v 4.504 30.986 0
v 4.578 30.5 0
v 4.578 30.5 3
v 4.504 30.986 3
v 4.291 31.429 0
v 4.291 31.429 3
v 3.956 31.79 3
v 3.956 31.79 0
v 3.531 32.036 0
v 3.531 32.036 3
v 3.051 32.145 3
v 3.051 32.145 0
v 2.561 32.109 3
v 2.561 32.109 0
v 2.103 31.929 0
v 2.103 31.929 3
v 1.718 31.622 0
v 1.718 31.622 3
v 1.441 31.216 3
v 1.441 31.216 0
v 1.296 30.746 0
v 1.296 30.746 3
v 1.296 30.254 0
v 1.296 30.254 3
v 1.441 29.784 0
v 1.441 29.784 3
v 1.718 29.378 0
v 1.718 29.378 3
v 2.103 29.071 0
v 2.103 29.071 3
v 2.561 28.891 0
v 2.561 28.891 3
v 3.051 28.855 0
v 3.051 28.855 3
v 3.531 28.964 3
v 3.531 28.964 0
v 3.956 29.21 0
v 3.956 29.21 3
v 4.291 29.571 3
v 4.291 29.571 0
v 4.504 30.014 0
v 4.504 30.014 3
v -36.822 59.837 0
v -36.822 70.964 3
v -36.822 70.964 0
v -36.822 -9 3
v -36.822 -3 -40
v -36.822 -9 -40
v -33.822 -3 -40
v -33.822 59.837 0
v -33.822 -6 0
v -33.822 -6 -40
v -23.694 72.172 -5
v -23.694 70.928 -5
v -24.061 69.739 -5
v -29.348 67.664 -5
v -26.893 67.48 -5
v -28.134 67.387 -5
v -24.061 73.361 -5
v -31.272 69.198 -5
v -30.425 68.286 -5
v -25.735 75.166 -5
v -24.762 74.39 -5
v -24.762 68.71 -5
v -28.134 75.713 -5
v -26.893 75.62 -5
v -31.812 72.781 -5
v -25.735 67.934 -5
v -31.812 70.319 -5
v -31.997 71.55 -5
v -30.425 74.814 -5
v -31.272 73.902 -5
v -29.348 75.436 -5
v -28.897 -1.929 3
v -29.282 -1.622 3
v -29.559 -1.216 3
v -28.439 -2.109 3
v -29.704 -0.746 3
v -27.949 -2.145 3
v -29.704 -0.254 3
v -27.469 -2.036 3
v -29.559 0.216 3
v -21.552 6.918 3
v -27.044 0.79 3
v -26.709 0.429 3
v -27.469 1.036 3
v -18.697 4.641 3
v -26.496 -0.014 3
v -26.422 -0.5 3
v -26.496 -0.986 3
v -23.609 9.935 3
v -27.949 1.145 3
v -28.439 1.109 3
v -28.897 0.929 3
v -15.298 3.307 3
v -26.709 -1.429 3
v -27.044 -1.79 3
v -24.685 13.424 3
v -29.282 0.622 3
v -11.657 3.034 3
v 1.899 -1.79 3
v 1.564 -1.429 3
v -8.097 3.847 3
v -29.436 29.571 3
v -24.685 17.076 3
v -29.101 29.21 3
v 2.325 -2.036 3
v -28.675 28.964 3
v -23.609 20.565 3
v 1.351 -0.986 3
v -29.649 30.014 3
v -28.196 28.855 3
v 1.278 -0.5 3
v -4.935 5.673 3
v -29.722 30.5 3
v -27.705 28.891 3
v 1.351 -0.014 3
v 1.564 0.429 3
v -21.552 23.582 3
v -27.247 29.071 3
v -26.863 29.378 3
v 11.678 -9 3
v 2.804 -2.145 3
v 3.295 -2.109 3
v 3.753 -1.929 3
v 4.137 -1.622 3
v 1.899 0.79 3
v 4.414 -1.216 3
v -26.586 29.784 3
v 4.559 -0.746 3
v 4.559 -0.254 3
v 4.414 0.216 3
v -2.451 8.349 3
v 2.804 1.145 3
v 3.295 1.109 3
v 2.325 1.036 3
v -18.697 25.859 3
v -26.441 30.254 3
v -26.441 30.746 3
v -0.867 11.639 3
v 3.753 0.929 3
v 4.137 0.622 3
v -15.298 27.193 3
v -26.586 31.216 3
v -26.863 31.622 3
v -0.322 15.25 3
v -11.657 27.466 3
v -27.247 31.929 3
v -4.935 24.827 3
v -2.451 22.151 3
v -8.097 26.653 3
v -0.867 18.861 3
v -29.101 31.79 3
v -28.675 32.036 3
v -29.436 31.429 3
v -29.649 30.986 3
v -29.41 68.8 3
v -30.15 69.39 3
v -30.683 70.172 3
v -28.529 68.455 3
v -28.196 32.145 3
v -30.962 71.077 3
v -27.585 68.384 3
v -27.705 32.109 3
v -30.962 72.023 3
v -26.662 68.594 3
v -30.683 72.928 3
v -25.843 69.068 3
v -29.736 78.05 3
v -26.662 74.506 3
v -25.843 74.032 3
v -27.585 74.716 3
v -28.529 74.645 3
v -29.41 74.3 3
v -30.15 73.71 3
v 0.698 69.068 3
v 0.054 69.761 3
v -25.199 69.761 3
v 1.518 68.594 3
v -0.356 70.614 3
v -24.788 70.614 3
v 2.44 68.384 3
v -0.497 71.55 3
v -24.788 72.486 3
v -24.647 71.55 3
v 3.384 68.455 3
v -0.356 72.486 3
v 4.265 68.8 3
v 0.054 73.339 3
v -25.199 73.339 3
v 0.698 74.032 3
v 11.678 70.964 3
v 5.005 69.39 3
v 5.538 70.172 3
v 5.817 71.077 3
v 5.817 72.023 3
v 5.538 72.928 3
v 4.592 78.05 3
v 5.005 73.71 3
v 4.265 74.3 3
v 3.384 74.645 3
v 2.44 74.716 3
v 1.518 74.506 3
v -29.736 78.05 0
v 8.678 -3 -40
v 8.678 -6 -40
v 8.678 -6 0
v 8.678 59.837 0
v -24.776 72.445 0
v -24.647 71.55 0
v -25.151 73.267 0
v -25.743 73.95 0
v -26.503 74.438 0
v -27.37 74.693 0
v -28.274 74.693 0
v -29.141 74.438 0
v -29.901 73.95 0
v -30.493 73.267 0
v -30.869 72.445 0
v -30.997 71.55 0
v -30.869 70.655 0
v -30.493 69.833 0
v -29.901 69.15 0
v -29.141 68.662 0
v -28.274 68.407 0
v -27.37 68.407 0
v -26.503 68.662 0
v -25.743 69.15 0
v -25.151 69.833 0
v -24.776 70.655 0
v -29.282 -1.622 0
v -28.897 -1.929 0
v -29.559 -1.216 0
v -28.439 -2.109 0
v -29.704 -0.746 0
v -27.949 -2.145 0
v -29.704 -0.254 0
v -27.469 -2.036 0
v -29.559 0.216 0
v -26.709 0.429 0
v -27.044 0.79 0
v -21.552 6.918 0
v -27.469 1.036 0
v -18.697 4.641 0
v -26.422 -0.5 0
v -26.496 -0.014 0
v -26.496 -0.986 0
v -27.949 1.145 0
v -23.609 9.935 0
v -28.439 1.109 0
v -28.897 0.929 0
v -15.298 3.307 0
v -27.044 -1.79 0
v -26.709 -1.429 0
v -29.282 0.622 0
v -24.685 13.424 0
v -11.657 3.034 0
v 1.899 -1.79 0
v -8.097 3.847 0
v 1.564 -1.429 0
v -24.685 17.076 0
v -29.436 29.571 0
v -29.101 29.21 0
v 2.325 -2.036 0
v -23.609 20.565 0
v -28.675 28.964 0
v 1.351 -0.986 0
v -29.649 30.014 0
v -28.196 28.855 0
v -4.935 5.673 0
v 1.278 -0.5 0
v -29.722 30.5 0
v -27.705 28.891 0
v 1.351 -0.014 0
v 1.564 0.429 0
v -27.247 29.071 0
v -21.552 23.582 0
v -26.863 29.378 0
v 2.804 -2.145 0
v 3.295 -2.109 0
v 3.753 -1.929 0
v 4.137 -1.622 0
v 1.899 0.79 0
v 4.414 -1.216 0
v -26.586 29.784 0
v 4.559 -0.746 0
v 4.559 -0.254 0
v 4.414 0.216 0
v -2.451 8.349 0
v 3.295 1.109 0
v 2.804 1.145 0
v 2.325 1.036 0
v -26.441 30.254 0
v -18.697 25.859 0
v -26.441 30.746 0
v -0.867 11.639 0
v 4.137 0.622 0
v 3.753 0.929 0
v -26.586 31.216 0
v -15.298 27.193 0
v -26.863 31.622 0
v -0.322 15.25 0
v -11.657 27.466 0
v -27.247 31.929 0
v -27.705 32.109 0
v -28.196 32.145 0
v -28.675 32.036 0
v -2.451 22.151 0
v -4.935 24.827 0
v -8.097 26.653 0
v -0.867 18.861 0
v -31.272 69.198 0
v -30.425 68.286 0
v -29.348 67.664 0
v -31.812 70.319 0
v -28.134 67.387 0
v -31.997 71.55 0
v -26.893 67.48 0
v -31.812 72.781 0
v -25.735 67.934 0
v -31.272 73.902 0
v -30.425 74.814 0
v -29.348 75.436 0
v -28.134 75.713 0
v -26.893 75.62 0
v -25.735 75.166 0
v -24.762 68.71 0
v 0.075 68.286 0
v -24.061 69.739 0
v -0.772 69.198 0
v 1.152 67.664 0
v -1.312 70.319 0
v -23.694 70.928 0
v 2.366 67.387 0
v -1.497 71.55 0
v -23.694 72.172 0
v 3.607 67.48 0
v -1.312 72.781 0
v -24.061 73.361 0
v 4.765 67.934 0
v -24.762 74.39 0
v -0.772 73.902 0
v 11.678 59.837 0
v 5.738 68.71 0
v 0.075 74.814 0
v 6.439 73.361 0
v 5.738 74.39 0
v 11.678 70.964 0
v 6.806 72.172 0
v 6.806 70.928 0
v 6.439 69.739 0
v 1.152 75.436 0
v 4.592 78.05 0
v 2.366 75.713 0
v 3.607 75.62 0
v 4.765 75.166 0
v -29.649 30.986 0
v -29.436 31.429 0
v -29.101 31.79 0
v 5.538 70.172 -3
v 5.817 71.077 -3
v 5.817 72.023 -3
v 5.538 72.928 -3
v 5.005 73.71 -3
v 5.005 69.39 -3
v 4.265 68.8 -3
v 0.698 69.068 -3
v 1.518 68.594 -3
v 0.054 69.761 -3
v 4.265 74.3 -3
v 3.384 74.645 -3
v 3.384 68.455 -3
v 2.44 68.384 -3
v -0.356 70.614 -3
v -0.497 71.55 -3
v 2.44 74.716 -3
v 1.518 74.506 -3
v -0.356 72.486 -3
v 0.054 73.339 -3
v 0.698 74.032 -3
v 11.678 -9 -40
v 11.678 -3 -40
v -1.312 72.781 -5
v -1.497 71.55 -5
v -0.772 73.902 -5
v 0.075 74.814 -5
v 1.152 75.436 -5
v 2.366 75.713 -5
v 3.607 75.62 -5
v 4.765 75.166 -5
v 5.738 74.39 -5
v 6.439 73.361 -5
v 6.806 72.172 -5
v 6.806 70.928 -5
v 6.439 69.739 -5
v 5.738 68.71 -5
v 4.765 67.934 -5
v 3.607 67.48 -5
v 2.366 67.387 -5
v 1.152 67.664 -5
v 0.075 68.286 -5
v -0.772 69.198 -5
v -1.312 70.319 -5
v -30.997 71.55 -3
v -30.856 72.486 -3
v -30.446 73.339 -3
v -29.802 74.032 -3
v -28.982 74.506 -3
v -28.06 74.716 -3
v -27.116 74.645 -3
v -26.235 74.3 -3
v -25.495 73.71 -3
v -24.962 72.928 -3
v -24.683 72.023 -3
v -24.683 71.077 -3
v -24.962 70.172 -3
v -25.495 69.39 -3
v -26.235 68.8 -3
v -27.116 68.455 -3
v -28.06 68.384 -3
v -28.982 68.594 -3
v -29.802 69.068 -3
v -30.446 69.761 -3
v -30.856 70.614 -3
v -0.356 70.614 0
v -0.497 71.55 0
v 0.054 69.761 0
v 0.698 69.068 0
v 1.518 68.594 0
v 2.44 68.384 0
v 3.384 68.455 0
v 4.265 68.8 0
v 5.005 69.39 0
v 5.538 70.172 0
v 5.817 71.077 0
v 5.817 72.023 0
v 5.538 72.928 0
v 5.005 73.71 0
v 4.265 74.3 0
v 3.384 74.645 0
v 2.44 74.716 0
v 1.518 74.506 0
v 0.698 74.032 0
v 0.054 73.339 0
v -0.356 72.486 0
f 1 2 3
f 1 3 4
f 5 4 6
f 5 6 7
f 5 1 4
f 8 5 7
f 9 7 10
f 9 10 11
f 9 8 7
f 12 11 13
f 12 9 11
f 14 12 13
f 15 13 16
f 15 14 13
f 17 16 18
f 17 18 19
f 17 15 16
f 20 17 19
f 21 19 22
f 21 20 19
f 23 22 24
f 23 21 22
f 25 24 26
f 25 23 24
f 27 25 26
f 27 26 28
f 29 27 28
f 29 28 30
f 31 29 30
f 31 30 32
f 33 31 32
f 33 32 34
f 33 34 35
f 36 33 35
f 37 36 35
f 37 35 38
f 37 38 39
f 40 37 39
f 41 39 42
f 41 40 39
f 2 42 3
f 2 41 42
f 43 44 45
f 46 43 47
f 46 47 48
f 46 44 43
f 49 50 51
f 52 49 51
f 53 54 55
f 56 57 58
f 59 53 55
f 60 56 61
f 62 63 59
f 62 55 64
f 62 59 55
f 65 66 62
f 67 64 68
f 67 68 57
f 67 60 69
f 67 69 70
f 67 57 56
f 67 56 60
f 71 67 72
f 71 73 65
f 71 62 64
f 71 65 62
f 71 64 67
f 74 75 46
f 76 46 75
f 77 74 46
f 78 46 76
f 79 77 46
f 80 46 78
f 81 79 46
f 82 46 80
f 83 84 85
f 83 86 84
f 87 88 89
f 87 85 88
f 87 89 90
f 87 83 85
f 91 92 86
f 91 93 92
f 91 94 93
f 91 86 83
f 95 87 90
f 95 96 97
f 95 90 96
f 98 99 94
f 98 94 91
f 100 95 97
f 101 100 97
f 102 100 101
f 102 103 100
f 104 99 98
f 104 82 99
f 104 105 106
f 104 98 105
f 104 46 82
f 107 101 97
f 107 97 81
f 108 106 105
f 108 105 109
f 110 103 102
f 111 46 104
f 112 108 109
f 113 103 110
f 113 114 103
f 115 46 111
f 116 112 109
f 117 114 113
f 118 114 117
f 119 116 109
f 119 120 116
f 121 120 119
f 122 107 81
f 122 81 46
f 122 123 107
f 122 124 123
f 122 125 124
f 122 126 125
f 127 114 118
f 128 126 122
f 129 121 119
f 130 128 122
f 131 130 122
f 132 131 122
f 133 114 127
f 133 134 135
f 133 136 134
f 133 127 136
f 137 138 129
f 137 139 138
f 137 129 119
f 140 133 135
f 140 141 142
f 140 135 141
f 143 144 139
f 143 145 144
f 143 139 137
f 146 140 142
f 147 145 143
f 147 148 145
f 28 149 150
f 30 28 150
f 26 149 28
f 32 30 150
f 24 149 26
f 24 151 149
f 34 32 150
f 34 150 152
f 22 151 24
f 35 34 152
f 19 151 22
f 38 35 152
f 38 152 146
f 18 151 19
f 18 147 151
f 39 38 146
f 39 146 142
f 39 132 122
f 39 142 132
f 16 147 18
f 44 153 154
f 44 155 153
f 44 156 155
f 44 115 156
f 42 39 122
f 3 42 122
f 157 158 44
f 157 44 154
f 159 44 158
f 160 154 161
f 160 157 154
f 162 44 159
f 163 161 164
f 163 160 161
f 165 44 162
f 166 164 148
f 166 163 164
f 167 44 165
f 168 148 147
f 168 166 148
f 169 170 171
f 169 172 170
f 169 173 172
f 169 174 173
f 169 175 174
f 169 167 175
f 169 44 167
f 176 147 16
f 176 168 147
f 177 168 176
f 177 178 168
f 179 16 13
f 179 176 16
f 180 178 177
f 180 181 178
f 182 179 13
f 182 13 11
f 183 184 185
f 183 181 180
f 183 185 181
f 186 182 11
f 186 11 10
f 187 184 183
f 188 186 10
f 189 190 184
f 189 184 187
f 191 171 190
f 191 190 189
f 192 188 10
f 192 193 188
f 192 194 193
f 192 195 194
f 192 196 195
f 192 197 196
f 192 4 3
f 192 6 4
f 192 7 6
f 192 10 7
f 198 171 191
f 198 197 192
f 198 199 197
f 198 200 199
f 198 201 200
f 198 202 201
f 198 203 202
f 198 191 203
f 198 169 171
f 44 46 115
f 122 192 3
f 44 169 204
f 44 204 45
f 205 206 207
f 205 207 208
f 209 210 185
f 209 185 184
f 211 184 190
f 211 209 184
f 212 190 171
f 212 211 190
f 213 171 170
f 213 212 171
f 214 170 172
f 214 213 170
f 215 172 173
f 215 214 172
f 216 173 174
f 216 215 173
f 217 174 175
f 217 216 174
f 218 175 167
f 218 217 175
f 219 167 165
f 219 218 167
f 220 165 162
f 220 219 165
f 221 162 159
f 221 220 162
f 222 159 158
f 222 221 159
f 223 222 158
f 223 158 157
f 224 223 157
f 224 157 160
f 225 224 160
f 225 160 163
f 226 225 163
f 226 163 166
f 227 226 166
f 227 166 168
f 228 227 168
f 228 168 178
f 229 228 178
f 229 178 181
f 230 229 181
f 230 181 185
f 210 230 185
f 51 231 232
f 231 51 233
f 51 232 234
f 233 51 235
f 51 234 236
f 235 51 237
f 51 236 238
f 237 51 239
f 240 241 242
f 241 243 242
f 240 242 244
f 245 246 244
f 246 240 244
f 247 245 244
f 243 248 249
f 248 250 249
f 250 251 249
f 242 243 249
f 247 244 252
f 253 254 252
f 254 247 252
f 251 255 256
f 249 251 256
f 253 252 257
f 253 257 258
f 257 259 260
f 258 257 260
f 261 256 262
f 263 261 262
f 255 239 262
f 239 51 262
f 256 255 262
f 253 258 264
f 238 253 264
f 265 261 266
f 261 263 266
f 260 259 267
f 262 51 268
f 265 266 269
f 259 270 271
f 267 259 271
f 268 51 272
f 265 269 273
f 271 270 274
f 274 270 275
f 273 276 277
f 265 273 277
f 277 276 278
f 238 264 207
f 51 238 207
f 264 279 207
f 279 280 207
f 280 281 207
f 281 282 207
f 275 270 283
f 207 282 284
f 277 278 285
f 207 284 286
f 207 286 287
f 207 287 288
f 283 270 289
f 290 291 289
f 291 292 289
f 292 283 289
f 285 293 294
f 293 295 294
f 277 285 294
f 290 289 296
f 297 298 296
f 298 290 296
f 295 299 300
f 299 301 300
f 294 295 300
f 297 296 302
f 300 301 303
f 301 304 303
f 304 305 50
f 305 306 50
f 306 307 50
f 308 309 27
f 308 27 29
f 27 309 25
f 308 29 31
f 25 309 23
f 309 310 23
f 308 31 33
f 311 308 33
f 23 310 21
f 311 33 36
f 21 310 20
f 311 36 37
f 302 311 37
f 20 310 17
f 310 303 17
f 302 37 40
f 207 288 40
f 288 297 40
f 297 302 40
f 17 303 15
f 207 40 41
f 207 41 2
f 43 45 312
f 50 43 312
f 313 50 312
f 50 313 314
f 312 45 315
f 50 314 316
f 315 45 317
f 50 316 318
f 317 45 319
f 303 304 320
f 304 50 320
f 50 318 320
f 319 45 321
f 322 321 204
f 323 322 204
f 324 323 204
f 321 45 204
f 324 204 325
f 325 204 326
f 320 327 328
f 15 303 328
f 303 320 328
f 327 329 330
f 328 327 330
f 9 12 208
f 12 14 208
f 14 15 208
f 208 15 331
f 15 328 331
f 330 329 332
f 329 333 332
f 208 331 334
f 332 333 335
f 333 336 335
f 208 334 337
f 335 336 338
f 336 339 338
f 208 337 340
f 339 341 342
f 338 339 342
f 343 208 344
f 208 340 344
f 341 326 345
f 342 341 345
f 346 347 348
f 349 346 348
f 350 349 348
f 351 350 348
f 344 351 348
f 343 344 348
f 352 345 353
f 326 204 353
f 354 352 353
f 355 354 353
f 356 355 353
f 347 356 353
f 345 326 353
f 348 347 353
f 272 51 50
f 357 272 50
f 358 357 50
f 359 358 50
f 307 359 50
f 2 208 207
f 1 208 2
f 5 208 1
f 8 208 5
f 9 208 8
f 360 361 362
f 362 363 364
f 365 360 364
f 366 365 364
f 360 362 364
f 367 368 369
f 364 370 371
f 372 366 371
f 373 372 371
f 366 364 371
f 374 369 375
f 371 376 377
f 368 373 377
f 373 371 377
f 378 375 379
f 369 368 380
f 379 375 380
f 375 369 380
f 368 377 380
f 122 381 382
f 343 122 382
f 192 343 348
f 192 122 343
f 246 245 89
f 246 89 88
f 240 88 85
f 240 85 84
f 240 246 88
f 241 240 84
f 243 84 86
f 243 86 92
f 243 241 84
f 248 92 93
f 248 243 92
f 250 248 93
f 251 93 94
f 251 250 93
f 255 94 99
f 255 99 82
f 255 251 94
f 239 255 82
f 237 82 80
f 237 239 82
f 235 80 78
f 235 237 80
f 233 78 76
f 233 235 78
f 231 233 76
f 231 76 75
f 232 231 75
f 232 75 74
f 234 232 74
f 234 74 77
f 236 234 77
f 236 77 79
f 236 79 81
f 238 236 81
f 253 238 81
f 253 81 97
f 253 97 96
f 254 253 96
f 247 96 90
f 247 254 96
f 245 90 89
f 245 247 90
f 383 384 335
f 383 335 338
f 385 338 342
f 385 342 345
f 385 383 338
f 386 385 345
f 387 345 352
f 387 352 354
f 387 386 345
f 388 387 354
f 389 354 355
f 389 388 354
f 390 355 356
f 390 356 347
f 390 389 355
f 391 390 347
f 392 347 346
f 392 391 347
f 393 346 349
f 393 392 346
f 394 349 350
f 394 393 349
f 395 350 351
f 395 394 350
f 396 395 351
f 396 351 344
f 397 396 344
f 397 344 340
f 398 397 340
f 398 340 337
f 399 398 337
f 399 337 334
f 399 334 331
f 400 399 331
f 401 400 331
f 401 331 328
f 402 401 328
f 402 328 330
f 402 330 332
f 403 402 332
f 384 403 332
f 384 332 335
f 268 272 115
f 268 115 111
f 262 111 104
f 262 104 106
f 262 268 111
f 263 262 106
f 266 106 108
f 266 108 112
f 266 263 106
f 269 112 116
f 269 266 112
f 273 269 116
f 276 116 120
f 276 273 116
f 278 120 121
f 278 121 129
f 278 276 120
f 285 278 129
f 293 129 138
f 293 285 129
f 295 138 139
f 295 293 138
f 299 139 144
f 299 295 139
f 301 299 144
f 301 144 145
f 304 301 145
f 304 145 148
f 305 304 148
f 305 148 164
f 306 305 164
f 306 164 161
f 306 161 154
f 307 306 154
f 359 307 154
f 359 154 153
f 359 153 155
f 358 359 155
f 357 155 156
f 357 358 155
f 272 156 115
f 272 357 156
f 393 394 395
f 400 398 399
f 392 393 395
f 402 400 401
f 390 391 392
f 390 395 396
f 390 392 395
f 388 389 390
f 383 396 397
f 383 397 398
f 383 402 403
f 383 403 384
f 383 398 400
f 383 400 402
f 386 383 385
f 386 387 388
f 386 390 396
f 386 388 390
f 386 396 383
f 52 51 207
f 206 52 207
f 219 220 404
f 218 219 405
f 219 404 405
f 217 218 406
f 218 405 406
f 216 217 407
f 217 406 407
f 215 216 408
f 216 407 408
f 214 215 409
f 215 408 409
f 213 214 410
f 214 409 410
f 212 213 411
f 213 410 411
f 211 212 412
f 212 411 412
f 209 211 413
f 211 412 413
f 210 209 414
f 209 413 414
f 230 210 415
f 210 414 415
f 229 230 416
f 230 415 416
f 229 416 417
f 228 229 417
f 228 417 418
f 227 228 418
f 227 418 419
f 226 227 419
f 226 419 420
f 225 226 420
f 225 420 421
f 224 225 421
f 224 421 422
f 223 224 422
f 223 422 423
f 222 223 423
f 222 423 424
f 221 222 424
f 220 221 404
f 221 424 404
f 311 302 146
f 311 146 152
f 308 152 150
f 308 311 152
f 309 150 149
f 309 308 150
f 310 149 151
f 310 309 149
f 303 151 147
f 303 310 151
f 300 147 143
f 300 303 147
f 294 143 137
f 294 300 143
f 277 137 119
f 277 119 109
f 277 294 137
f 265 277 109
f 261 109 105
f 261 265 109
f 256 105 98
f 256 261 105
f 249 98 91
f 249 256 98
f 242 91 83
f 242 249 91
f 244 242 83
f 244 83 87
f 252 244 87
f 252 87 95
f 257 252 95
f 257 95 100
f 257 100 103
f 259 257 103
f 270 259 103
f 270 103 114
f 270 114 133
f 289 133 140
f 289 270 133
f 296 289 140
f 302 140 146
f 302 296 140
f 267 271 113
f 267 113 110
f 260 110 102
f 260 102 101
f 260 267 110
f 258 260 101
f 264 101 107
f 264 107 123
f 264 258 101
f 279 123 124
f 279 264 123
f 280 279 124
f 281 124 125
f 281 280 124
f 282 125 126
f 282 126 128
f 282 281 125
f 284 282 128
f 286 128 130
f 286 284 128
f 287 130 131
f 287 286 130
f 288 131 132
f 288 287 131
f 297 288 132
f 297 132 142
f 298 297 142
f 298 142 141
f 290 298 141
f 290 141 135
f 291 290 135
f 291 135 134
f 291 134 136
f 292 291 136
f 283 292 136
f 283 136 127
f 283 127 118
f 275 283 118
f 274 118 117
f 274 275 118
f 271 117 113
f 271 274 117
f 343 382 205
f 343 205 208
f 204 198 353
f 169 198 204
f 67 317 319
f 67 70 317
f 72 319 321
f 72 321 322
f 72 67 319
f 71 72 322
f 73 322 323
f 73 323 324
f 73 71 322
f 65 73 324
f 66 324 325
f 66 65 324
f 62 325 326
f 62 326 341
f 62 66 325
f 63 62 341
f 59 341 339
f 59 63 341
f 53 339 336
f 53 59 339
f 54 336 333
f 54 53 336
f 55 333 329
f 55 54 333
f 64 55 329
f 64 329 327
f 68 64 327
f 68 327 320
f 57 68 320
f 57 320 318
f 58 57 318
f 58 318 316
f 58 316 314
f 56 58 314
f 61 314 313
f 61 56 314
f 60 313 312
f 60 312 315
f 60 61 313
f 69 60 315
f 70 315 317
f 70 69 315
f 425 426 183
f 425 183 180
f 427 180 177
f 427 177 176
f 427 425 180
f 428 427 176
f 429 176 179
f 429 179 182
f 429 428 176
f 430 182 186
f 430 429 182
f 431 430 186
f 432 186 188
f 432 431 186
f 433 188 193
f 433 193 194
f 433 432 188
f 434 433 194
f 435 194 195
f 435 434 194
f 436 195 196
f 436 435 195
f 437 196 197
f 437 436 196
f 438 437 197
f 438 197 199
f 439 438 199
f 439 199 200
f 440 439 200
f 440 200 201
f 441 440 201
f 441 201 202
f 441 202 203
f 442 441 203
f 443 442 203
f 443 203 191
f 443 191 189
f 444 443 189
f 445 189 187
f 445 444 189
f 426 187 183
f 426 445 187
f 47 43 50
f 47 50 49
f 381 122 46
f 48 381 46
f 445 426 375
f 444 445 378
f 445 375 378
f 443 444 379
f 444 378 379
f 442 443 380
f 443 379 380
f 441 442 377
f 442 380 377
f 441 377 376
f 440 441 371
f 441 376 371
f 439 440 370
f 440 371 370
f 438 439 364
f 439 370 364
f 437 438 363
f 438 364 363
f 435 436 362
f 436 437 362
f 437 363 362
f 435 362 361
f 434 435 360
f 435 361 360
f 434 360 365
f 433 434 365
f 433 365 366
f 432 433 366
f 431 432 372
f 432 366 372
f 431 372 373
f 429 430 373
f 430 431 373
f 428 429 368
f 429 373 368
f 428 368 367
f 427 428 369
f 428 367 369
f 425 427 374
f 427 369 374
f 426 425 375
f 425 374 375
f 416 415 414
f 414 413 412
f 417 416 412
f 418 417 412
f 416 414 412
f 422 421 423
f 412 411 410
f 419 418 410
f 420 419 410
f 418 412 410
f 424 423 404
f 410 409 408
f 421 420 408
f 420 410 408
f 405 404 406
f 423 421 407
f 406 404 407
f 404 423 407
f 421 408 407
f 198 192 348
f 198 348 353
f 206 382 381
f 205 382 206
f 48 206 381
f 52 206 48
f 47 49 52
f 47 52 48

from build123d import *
from build123d.topology import SkipClean

# Parameters (mm, degrees)
SKETCH1_R                = 1.65
SKETCH1_R_2              = 12.25
SKETCH1_R_3              = 3.175
BOSS_EXTRUDE1_DEPTH      = 3
BOSS_EXTRUDE2_START      = 3
SKETCH2_R                = 4.175
SKETCH2_R_2              = 3.175
BOSS_EXTRUDE2_DEPTH      = 3
BOSS_EXTRUDE3_START      = 2
SKETCH3_R                = 4.175
BOSS_EXTRUDE3_DEPTH      = 2
BOSS_EXTRUDE4_DEPTH      = 40
BOSS_EXTRUDE4_DEPTH_BACK = 3
SKETCH5_W                = 3
SKETCH5_H                = 5
BOSS_EXTRUDE5_DEPTH      = 3
BOSS_EXTRUDE7_DEPTH      = 3
BOSS_EXTRUDE9_DEPTH      = 3
SKETCH9_W                = 3
SKETCH9_H                = 75.55
BOSS_EXTRUDE10_DEPTH     = 3
CHAMFER1_SIZE            = 3
BOSS_EXTRUDE12_DEPTH     = 3
BOSS_EXTRUDE13_DEPTH     = 3
BOSS_EXTRUDE14_DEPTH     = 3


with BuildPart() as part:
    # Sketch1 → Boss-Extrude1 (new body)
    with BuildSketch(Plane.XY):
        Polygon((-33.82227566, -6), (-33.82227566, 36.5), (-33.82227566, 72.55), (-28.82227566, 77.55), (3.67772434, 77.55), (8.67772434, 72.55), (8.67772434, 36.5), (8.67772434, -6), align=None)
        with Locations((2.92772434, 30.5)):
            Circle(SKETCH1_R, mode=Mode.SUBTRACT)
        with Locations(Location((2.92772434, -0.5, 0), (0, 0, 180))):
            Circle(SKETCH1_R, mode=Mode.SUBTRACT)
        with Locations((-28.07227566, -0.5)):
            Circle(SKETCH1_R, mode=Mode.SUBTRACT)
        with Locations(Location((-28.07227566, 30.5, 0), (0, 0, 180))):
            Circle(SKETCH1_R, mode=Mode.SUBTRACT)
        with Locations((-12.57227566, 15.25)):
            Circle(SKETCH1_R_2, mode=Mode.SUBTRACT)
        with Locations((-27.82227566, 71.55)):
            Circle(SKETCH1_R_3, mode=Mode.SUBTRACT)
        with Locations(Location((2.67772434, 71.55, 0), (0, 0, 180))):
            Circle(SKETCH1_R_3, mode=Mode.SUBTRACT)
    extrude(amount=BOSS_EXTRUDE1_DEPTH)

    # Sketch2 → Boss-Extrude2 (add)
    # profile 1 of 2: a face of its own
    with SkipClean():  # the faces are left unmerged after this step: merging them gives an invalid solid
        with BuildSketch(Plane(origin=(0, 0, 0), x_dir=(-1, 0, 0), z_dir=(0, 0, -1)).offset(BOSS_EXTRUDE2_START)):
            with Locations((-2.67772434, 71.55)):
                Circle(SKETCH2_R)
            with Locations((-2.67772434, 71.55)):
                Circle(SKETCH2_R_2, mode=Mode.SUBTRACT)
        # profile 2 of 2: a face of its own
        with BuildSketch(Plane(origin=(0, 0, 0), x_dir=(-1, 0, 0), z_dir=(0, 0, -1)).offset(BOSS_EXTRUDE2_START)):
            with Locations((27.82227566, 71.55)):
                Circle(SKETCH2_R)
            with Locations((27.82227566, 71.55)):
                Circle(SKETCH2_R_2, mode=Mode.SUBTRACT)
        extrude(amount=-BOSS_EXTRUDE2_DEPTH)

    # Sketch3 → Boss-Extrude3 (add)
    with SkipClean():  # the faces are left unmerged after this step: merging them gives an invalid solid
        with BuildSketch(Plane(origin=(0, 0, -3), x_dir=(-1, 0, 0), z_dir=(0, 0, -1)).offset(BOSS_EXTRUDE3_START)):
            with Locations((-2.67772434, 71.55)):
                Circle(SKETCH3_R)
            with Locations((27.82227566, 71.55)):
                Circle(SKETCH3_R)
        extrude(amount=-BOSS_EXTRUDE3_DEPTH)

    # Sketch5 → Boss-Extrude5 (add)
    with SkipClean():  # the faces are left unmerged after this step: merging them gives an invalid solid
        with BuildSketch(Plane.XY.offset(3)):
            with Locations((10.17772434, 45.531399611)):
                Rectangle(SKETCH5_W, SKETCH5_H)
            with Locations((-35.32227566, 45.531399611)):
                Rectangle(SKETCH5_W, SKETCH5_H)
        extrude(amount=-BOSS_EXTRUDE5_DEPTH)



with BuildPart() as body_2:
    # Sketch4 → Boss-Extrude4 (new, two sides: drawn at the far end of the back side and taken through both)
    with BuildSketch(Plane(origin=(0, 0, 0), x_dir=(-1, 0, 0), z_dir=(0, 0, -1)).offset(-BOSS_EXTRUDE4_DEPTH_BACK)):
        Polygon((33.82227566, -6), (-8.67772434, -6), (-8.67772434, -3), (-11.67772434, -3), (-11.67772434, -9), (-9.078713654, -9), (33.421286346, -9), (36.82227566, -9), (36.82227566, -3), (33.82227566, -3), align=None)
    extrude(amount=BOSS_EXTRUDE4_DEPTH + BOSS_EXTRUDE4_DEPTH_BACK)


with BuildPart() as part_1:
    with SkipClean():  # the faces are left unmerged after this step: merging them gives an invalid solid
        add(part.part)

        add(body_2.part)  # Boss-Extrude7 merges body 2
        # Sketch6 → Boss-Extrude7 (add)
        with BuildSketch(Plane(origin=(8.67772434, 0, 0), x_dir=(0, 0, -1), z_dir=(1, 0, 0))):
            Polygon((0, 48.031399611), (40, -3), (36.080844313, -3), (0, 43.031399611), align=None)
        extrude(amount=BOSS_EXTRUDE7_DEPTH)

    # Sketch8 → Boss-Extrude9 (add)
    with SkipClean():  # the faces are left unmerged after this step: merging them gives an invalid solid
        with BuildSketch(Plane.ZY.offset(36.82227566)):
            Polygon((0, 48.031399611), (0, 43.031399611), (-36.080844313, -3), (-40, -3), align=None)
        extrude(amount=-BOSS_EXTRUDE9_DEPTH)

    # Sketch9 → Boss-Extrude10 (add)
    with SkipClean():  # the faces are left unmerged after this step: merging them gives an invalid solid
        with BuildSketch(Plane.XY.offset(3)):
            with Locations((-35.32227566, 34.775)):
                Rectangle(SKETCH9_W, SKETCH9_H)
            with Locations((10.17772434, 34.775)):
                Rectangle(SKETCH9_W, SKETCH9_H)
        extrude(amount=-BOSS_EXTRUDE10_DEPTH)

    # Chamfer1
    chamfer1_edges = [part_1.edges().sort_by_distance(p)[0] for p in [
        (11.67772434, 72.55, 1.5),
        (-36.82227566, 72.55, 1.5),
    ]]
    chamfer(chamfer1_edges, length=CHAMFER1_SIZE - 0.0001)  # a hair under: the kernel refuses the full size

    # Sketch10 → Boss-Extrude12 (add)
    with BuildSketch(Plane(origin=(11.67772434, 0, 0), x_dir=(0, 0, -1), z_dir=(1, 0, 0))):
        Polygon((-3, 64.55), (-3, -9), (40, -9), (40, -3), align=None)
    extrude(amount=-BOSS_EXTRUDE12_DEPTH)

    # Sketch11 → Boss-Extrude13 (add)
    with BuildSketch(Plane.ZY.offset(36.82227566)):
        Polygon((3, -9), (3, 64.55), (-40, -3), (-40, -9), align=None)
    extrude(amount=-BOSS_EXTRUDE13_DEPTH)

    # Sketch12 → Boss-Extrude14 (add)
    with BuildSketch(Plane.XY.offset(3)):
        Polygon((-36.82227566, 70.964213562), (-36.82227566, 69.55), (-33.82227566, 72.55), (-28.82227566, 77.55), (-12.57227566, 77.55), (-12.57227566, 78.05), (-29.736489222, 78.05), align=None)
        Polygon((4.591937902, 78.05), (-12.57227566, 78.05), (-12.57227566, 77.55), (3.67772434, 77.55), (8.67772434, 72.55), (11.67772434, 69.55), (11.67772434, 70.964213562), align=None)
    extrude(amount=-BOSS_EXTRUDE14_DEPTH)


solid = part_1.part
